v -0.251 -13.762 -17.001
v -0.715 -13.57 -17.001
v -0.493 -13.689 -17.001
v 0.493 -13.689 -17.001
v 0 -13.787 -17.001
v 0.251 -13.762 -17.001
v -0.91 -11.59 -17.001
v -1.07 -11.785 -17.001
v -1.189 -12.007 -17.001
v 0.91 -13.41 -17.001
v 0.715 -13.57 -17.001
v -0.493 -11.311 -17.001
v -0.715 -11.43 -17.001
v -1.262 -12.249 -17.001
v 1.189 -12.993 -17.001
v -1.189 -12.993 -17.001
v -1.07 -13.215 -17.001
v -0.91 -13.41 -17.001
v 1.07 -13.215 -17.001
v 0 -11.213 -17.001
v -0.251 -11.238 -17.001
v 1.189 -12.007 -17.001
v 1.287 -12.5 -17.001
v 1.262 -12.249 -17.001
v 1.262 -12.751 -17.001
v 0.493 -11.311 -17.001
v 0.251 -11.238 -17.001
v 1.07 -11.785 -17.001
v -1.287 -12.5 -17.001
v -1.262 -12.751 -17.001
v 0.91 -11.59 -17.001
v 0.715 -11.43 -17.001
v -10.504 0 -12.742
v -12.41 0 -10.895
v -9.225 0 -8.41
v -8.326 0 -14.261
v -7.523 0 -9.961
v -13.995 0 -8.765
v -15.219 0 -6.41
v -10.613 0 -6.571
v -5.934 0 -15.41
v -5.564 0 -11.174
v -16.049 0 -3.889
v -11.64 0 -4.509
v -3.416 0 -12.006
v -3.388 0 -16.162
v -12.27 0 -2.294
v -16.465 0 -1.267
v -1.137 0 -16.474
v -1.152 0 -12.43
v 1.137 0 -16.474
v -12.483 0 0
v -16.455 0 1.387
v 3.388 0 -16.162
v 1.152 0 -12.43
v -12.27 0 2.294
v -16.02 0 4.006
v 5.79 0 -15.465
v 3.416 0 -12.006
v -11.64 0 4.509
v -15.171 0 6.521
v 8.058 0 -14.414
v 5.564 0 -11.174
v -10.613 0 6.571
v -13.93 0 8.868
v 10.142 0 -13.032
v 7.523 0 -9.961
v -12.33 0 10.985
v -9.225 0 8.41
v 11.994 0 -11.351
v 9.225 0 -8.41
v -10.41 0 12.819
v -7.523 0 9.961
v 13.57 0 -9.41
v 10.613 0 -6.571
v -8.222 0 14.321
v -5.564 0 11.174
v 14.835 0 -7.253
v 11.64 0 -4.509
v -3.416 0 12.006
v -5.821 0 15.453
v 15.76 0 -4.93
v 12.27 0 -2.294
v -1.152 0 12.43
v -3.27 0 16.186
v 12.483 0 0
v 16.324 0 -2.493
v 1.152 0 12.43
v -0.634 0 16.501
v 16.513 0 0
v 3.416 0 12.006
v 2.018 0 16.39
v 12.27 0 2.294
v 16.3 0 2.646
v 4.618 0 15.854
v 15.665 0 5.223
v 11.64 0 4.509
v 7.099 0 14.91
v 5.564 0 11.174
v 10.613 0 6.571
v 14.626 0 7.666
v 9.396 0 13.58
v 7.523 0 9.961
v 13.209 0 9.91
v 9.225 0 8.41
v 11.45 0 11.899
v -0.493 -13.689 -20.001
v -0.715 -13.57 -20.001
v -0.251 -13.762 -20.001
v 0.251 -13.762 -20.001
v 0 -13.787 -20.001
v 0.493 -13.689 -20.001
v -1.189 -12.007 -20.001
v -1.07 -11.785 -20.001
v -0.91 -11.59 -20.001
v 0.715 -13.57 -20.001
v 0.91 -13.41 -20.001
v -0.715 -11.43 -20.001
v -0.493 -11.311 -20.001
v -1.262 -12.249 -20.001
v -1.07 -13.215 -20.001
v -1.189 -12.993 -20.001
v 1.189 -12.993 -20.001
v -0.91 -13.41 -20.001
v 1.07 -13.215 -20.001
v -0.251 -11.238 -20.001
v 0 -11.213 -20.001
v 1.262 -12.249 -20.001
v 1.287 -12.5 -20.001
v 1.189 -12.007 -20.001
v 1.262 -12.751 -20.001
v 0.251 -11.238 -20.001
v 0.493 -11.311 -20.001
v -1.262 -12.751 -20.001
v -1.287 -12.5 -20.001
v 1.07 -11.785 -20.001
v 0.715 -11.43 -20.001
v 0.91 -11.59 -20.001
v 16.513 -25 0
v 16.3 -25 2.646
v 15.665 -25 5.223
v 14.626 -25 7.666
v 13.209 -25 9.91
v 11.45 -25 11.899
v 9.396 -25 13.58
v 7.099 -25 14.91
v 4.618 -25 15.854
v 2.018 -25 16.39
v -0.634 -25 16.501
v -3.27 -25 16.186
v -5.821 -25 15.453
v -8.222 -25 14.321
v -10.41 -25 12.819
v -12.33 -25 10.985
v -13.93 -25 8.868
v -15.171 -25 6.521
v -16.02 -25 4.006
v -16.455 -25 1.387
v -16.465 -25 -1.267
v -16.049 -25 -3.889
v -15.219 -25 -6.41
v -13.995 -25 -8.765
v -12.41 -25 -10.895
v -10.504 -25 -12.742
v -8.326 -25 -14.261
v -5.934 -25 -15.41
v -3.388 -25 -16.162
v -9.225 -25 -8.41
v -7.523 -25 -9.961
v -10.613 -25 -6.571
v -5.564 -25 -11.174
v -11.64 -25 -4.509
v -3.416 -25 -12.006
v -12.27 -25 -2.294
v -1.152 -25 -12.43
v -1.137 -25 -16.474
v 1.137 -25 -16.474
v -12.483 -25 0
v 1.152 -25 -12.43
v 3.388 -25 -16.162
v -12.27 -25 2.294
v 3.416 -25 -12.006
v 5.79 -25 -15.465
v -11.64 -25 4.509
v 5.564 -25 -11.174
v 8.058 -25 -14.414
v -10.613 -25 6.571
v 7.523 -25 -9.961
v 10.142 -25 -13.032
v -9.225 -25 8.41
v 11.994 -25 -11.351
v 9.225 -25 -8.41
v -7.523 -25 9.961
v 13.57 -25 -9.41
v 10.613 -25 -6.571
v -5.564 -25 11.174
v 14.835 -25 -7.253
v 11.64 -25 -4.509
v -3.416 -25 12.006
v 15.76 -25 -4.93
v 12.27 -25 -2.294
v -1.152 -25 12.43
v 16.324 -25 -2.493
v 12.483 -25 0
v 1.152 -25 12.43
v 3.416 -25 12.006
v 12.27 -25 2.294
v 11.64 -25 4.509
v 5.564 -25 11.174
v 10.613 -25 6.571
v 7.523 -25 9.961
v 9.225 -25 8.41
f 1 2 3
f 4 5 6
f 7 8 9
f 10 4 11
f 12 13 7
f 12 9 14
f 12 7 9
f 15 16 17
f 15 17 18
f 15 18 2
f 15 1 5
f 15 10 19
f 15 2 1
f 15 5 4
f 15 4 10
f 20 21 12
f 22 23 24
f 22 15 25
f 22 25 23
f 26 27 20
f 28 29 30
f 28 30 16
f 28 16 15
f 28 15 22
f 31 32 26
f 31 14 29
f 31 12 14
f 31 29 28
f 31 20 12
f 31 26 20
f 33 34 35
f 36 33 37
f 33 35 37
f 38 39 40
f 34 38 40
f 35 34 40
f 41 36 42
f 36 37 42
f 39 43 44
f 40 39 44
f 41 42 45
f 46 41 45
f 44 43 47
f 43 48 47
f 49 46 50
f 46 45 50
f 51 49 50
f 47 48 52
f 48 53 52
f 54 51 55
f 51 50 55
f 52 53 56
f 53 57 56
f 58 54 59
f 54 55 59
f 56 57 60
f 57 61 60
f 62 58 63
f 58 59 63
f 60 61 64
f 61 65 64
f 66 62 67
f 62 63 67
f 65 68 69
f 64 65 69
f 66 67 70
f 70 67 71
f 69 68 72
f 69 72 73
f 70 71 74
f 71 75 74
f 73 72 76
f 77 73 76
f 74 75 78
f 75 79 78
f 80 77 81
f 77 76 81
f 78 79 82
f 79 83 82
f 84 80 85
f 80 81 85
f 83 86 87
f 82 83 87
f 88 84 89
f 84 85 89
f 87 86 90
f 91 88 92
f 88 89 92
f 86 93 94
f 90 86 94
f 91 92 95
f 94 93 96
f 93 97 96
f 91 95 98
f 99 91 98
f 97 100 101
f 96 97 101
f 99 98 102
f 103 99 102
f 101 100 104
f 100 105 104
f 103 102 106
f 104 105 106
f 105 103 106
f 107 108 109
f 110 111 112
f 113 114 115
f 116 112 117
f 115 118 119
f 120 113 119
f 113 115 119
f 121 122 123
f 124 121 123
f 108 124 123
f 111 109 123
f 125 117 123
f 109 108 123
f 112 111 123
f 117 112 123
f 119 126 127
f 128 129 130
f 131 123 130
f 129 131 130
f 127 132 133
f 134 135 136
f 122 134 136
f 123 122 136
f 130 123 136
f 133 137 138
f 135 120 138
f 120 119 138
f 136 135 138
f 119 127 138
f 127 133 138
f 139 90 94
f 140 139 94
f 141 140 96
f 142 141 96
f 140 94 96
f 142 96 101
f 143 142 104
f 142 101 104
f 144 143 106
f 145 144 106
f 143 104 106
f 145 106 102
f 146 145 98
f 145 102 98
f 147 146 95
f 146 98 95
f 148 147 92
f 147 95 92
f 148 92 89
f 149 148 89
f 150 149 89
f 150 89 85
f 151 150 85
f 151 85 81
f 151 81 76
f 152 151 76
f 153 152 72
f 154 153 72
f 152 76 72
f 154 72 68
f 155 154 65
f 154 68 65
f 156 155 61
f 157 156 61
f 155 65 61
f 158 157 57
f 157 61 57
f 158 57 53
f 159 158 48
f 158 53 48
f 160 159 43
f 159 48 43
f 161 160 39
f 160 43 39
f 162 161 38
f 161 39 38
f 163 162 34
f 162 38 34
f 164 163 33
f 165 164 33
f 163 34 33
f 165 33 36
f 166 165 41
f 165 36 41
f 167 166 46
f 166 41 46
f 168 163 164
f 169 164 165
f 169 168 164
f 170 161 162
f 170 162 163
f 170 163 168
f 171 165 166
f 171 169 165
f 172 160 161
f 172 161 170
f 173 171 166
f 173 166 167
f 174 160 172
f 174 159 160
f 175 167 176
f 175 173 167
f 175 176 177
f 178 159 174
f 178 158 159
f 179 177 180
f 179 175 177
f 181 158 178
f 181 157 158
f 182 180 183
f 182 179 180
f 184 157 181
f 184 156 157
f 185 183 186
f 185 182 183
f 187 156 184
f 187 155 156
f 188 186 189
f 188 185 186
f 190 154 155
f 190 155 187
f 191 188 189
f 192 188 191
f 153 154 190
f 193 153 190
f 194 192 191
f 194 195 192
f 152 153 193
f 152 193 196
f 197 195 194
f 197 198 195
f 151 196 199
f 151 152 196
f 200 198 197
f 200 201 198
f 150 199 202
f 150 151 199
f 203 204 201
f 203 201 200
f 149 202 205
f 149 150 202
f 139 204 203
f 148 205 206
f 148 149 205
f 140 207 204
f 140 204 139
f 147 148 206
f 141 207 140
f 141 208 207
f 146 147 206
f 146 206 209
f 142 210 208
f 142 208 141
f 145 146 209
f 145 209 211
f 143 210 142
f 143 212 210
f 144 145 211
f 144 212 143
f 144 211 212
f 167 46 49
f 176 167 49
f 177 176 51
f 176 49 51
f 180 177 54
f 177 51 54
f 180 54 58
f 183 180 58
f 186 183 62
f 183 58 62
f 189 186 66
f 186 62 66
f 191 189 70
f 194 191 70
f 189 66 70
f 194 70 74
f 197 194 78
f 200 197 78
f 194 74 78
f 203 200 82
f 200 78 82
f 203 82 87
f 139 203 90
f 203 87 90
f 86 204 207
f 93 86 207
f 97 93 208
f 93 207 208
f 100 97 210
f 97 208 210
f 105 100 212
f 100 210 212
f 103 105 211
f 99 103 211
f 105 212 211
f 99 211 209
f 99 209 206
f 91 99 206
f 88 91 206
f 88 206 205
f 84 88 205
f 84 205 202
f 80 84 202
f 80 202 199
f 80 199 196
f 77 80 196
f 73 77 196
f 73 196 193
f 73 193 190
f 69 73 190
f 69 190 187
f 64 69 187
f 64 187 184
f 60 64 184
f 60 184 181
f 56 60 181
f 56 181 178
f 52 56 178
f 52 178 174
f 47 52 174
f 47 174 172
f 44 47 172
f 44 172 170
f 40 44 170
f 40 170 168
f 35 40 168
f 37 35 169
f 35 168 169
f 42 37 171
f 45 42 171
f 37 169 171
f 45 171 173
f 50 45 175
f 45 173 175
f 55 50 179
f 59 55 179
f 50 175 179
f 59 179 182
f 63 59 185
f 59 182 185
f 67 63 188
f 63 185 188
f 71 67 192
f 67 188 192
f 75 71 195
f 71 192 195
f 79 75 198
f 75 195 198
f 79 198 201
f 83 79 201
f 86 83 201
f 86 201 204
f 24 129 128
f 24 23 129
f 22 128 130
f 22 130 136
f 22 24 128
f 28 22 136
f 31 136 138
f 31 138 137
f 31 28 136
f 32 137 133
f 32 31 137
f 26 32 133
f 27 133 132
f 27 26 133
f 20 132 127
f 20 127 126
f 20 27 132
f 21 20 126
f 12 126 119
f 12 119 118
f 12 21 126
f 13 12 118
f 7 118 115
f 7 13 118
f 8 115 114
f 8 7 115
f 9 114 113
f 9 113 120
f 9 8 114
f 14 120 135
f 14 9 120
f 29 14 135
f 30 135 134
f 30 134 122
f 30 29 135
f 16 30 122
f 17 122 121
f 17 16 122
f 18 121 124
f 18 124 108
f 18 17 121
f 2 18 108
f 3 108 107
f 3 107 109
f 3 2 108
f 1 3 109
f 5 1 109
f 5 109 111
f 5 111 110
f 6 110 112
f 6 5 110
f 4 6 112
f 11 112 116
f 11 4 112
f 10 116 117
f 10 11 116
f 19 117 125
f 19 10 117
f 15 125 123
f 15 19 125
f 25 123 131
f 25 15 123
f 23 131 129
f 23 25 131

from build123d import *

# Parameters (mm, degrees)
F1_DEPTH = 25
F2_R     = 12.4828054131
F3_DEPTH = 30
F5_R     = 1.2870142299
F6_DEPTH = 1.5


with BuildPart() as f1:
    # F0 (on Front) → F1 (new body)
    with BuildSketch(Plane.XZ):
        with BuildLine():
            Line((-3.388106823, -14.5254029512), (-3.388106823, -16.1620440826))
            ThreePointArc((-3.388106823, -16.1620440826), (0, -16.5133563146), (3.388106823, -16.1620440826))
            Line((3.388106823, -16.1620440826), (3.388106823, -14.5254029512))
            Line((3.388106823, -14.5254029512), (-3.388106823, -14.5254029512))
        make_face()
        with BuildLine():
            ThreePointArc((3.388106823, -16.1620440826), (12.8187353505, -10.4101374048), (16.5133563146, 0))
            ThreePointArc((16.5133563146, 0), (-10.4101374048, 12.8187353505), (-3.388106823, -16.1620440826))
            Line((-3.388106823, -16.1620440826), (-3.388106823, -14.5254029512))
            Line((-3.388106823, -14.5254029512), (3.388106823, -14.5254029512))
            Line((3.388106823, -14.5254029512), (3.388106823, -16.1620440826))
        make_face()
    extrude(amount=F1_DEPTH)

    # F2 (on face) → F3 (cut)
    with BuildSketch(Plane.XZ.offset(25)):
        Circle(F2_R)
    extrude(amount=-F3_DEPTH, mode=Mode.SUBTRACT)


with BuildPart() as f6:
    # F5 (on face) → F6 (new body, symmetric)
    with BuildSketch(Plane.XY.offset(-18.501309678)):
        with Locations((0, -12.5)):
            Circle(F5_R)
    extrude(amount=F6_DEPTH, both=True)


solid = Compound([f1.part, f6.part])
